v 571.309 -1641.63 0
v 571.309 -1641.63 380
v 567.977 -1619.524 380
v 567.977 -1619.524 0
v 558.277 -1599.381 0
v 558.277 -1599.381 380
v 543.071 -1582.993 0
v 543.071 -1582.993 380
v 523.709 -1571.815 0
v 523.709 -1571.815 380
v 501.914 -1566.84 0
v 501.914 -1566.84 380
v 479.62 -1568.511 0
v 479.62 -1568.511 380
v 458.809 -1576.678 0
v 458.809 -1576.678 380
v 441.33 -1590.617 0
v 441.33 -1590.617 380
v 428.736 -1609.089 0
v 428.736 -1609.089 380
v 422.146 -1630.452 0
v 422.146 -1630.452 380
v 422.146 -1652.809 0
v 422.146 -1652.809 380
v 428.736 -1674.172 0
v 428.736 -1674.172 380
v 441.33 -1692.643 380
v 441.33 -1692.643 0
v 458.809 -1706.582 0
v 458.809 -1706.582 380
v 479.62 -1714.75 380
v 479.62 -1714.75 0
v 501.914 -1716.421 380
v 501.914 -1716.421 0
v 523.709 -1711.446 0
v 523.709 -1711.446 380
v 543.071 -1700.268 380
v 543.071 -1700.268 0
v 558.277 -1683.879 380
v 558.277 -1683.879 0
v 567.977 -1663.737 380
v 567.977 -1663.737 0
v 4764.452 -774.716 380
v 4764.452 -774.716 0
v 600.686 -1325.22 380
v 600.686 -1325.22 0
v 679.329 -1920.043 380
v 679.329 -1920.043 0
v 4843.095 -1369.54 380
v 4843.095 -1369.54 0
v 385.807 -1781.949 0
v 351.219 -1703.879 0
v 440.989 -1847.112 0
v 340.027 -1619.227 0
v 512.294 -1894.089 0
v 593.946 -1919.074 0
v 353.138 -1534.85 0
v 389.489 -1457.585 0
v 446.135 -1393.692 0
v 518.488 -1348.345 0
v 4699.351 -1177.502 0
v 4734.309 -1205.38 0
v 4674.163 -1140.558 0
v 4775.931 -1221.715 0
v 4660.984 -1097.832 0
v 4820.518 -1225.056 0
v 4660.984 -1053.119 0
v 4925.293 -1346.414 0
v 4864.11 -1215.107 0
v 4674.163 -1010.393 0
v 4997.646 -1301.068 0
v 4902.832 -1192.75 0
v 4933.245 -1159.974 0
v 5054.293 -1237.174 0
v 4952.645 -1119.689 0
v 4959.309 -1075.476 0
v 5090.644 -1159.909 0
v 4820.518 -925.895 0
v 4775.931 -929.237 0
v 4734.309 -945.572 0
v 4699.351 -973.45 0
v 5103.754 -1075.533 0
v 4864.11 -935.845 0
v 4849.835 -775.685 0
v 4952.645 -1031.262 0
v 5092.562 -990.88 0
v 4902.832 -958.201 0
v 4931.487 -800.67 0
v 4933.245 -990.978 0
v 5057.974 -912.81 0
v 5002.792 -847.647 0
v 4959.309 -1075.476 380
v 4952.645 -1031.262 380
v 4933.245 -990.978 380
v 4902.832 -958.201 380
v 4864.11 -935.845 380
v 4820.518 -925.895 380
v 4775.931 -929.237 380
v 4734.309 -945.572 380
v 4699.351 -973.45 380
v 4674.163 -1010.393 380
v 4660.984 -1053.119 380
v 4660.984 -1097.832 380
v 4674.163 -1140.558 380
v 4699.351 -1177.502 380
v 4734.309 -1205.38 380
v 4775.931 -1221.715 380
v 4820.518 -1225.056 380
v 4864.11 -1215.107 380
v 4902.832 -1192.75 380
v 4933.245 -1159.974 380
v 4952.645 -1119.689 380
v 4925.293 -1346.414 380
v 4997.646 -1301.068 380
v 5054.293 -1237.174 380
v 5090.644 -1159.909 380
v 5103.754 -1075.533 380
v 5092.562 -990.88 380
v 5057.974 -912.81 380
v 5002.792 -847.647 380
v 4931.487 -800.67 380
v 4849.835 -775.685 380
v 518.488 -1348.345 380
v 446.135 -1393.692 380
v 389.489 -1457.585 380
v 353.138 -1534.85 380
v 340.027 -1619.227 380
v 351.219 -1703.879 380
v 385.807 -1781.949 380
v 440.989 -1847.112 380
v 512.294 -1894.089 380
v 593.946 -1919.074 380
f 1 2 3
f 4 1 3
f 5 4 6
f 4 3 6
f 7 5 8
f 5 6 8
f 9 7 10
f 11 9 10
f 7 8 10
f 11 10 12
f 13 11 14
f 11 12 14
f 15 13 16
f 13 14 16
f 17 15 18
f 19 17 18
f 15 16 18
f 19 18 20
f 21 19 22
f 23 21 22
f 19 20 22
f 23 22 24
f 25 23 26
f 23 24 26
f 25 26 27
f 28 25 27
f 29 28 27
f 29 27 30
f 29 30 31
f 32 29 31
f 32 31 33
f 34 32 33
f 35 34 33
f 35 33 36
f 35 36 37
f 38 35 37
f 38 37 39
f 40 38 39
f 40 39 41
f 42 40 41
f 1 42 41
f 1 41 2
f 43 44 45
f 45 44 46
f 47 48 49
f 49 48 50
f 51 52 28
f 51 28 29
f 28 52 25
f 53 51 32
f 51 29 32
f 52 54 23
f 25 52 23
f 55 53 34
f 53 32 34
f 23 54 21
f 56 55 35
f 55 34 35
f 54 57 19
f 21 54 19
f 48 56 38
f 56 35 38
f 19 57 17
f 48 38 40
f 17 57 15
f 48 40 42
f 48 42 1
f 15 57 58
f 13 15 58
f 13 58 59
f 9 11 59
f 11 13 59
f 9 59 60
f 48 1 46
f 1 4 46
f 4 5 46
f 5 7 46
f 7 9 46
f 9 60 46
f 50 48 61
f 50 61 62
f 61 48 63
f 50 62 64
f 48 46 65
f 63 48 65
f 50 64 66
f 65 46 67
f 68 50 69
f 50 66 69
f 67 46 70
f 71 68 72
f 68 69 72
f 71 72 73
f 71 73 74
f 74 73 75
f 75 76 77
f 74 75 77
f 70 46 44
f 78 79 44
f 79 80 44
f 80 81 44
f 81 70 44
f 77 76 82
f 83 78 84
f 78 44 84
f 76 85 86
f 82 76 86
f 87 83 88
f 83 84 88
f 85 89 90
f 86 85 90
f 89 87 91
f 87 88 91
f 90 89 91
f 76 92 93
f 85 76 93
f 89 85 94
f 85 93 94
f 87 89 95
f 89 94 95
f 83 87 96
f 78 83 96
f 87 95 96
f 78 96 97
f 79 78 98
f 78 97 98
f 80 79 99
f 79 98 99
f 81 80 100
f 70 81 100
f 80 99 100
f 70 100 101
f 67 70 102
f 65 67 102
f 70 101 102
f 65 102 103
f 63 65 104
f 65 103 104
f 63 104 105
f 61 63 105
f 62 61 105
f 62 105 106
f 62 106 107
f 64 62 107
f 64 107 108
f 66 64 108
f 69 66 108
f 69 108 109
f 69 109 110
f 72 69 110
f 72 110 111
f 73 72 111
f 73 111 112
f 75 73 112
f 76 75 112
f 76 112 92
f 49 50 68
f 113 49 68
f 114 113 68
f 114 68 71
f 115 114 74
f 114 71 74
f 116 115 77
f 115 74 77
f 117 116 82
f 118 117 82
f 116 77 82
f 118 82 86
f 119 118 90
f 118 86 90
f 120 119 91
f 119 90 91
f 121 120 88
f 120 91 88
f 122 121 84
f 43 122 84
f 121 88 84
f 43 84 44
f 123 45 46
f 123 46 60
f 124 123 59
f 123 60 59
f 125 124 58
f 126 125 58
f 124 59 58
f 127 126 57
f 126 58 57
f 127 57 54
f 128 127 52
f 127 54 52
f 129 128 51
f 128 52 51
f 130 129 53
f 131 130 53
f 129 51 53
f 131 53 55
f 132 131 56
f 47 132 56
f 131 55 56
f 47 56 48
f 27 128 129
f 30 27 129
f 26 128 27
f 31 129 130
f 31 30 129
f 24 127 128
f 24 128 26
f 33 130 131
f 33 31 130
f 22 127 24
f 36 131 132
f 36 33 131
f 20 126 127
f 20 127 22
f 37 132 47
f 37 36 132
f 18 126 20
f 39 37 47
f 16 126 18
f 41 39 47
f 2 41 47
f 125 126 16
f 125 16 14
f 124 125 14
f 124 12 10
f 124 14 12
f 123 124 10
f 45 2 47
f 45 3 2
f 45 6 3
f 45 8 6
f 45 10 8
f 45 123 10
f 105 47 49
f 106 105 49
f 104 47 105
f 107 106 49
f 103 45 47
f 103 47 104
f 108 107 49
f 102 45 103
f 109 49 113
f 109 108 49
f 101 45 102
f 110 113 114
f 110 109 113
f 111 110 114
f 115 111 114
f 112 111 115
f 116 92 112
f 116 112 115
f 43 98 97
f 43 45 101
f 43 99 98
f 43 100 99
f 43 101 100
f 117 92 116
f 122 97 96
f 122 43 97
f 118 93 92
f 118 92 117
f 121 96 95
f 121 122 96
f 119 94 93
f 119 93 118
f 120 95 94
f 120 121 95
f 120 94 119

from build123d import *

# Parameters (mm, degrees)
BOSS_EXTRUDE1_DEPTH = 380
SKETCH2_R           = 150
CUT_EXTRUDE1_DEPTH  = 381
SKETCH4_R           = 75
CUT_EXTRUDE2_DEPTH  = 381


with BuildPart() as part:
    # Sketch1 → Boss-Extrude1 (new body)
    with BuildSketch(Plane.XY):
        with BuildLine():
            Line((4764.45194236, -774.716056977), (600.686121492, -1325.219634596))
            ThreePointArc((600.686121492, -1325.219634596), (342.59596126, -1661.95316306), (679.329489724, -1920.043323292))
            Line((679.329489724, -1920.043323292), (4843.095310591, -1369.539745672))
            ThreePointArc((4843.095310591, -1369.539745672), (5101.185470824, -1032.806217209), (4764.45194236, -774.716056977))
        make_face()
    extrude(amount=BOSS_EXTRUDE1_DEPTH)

    # Sketch2 → Cut-Extrude1 (cut, through all)
    with BuildSketch(Plane.XY.offset(380)):
        with Locations((4809.308774546, -1075.475725569)):
            Circle(SKETCH2_R)
    extrude(amount=-CUT_EXTRUDE1_DEPTH, mode=Mode.SUBTRACT)

    # Sketch4 → Cut-Extrude2 (cut, through all)
    with BuildSketch(Plane.XY.offset(380)):
        with Locations((496.308780647, -1641.630344573)):
            Circle(SKETCH4_R)
    extrude(amount=-CUT_EXTRUDE2_DEPTH, mode=Mode.SUBTRACT)


solid = part.part
